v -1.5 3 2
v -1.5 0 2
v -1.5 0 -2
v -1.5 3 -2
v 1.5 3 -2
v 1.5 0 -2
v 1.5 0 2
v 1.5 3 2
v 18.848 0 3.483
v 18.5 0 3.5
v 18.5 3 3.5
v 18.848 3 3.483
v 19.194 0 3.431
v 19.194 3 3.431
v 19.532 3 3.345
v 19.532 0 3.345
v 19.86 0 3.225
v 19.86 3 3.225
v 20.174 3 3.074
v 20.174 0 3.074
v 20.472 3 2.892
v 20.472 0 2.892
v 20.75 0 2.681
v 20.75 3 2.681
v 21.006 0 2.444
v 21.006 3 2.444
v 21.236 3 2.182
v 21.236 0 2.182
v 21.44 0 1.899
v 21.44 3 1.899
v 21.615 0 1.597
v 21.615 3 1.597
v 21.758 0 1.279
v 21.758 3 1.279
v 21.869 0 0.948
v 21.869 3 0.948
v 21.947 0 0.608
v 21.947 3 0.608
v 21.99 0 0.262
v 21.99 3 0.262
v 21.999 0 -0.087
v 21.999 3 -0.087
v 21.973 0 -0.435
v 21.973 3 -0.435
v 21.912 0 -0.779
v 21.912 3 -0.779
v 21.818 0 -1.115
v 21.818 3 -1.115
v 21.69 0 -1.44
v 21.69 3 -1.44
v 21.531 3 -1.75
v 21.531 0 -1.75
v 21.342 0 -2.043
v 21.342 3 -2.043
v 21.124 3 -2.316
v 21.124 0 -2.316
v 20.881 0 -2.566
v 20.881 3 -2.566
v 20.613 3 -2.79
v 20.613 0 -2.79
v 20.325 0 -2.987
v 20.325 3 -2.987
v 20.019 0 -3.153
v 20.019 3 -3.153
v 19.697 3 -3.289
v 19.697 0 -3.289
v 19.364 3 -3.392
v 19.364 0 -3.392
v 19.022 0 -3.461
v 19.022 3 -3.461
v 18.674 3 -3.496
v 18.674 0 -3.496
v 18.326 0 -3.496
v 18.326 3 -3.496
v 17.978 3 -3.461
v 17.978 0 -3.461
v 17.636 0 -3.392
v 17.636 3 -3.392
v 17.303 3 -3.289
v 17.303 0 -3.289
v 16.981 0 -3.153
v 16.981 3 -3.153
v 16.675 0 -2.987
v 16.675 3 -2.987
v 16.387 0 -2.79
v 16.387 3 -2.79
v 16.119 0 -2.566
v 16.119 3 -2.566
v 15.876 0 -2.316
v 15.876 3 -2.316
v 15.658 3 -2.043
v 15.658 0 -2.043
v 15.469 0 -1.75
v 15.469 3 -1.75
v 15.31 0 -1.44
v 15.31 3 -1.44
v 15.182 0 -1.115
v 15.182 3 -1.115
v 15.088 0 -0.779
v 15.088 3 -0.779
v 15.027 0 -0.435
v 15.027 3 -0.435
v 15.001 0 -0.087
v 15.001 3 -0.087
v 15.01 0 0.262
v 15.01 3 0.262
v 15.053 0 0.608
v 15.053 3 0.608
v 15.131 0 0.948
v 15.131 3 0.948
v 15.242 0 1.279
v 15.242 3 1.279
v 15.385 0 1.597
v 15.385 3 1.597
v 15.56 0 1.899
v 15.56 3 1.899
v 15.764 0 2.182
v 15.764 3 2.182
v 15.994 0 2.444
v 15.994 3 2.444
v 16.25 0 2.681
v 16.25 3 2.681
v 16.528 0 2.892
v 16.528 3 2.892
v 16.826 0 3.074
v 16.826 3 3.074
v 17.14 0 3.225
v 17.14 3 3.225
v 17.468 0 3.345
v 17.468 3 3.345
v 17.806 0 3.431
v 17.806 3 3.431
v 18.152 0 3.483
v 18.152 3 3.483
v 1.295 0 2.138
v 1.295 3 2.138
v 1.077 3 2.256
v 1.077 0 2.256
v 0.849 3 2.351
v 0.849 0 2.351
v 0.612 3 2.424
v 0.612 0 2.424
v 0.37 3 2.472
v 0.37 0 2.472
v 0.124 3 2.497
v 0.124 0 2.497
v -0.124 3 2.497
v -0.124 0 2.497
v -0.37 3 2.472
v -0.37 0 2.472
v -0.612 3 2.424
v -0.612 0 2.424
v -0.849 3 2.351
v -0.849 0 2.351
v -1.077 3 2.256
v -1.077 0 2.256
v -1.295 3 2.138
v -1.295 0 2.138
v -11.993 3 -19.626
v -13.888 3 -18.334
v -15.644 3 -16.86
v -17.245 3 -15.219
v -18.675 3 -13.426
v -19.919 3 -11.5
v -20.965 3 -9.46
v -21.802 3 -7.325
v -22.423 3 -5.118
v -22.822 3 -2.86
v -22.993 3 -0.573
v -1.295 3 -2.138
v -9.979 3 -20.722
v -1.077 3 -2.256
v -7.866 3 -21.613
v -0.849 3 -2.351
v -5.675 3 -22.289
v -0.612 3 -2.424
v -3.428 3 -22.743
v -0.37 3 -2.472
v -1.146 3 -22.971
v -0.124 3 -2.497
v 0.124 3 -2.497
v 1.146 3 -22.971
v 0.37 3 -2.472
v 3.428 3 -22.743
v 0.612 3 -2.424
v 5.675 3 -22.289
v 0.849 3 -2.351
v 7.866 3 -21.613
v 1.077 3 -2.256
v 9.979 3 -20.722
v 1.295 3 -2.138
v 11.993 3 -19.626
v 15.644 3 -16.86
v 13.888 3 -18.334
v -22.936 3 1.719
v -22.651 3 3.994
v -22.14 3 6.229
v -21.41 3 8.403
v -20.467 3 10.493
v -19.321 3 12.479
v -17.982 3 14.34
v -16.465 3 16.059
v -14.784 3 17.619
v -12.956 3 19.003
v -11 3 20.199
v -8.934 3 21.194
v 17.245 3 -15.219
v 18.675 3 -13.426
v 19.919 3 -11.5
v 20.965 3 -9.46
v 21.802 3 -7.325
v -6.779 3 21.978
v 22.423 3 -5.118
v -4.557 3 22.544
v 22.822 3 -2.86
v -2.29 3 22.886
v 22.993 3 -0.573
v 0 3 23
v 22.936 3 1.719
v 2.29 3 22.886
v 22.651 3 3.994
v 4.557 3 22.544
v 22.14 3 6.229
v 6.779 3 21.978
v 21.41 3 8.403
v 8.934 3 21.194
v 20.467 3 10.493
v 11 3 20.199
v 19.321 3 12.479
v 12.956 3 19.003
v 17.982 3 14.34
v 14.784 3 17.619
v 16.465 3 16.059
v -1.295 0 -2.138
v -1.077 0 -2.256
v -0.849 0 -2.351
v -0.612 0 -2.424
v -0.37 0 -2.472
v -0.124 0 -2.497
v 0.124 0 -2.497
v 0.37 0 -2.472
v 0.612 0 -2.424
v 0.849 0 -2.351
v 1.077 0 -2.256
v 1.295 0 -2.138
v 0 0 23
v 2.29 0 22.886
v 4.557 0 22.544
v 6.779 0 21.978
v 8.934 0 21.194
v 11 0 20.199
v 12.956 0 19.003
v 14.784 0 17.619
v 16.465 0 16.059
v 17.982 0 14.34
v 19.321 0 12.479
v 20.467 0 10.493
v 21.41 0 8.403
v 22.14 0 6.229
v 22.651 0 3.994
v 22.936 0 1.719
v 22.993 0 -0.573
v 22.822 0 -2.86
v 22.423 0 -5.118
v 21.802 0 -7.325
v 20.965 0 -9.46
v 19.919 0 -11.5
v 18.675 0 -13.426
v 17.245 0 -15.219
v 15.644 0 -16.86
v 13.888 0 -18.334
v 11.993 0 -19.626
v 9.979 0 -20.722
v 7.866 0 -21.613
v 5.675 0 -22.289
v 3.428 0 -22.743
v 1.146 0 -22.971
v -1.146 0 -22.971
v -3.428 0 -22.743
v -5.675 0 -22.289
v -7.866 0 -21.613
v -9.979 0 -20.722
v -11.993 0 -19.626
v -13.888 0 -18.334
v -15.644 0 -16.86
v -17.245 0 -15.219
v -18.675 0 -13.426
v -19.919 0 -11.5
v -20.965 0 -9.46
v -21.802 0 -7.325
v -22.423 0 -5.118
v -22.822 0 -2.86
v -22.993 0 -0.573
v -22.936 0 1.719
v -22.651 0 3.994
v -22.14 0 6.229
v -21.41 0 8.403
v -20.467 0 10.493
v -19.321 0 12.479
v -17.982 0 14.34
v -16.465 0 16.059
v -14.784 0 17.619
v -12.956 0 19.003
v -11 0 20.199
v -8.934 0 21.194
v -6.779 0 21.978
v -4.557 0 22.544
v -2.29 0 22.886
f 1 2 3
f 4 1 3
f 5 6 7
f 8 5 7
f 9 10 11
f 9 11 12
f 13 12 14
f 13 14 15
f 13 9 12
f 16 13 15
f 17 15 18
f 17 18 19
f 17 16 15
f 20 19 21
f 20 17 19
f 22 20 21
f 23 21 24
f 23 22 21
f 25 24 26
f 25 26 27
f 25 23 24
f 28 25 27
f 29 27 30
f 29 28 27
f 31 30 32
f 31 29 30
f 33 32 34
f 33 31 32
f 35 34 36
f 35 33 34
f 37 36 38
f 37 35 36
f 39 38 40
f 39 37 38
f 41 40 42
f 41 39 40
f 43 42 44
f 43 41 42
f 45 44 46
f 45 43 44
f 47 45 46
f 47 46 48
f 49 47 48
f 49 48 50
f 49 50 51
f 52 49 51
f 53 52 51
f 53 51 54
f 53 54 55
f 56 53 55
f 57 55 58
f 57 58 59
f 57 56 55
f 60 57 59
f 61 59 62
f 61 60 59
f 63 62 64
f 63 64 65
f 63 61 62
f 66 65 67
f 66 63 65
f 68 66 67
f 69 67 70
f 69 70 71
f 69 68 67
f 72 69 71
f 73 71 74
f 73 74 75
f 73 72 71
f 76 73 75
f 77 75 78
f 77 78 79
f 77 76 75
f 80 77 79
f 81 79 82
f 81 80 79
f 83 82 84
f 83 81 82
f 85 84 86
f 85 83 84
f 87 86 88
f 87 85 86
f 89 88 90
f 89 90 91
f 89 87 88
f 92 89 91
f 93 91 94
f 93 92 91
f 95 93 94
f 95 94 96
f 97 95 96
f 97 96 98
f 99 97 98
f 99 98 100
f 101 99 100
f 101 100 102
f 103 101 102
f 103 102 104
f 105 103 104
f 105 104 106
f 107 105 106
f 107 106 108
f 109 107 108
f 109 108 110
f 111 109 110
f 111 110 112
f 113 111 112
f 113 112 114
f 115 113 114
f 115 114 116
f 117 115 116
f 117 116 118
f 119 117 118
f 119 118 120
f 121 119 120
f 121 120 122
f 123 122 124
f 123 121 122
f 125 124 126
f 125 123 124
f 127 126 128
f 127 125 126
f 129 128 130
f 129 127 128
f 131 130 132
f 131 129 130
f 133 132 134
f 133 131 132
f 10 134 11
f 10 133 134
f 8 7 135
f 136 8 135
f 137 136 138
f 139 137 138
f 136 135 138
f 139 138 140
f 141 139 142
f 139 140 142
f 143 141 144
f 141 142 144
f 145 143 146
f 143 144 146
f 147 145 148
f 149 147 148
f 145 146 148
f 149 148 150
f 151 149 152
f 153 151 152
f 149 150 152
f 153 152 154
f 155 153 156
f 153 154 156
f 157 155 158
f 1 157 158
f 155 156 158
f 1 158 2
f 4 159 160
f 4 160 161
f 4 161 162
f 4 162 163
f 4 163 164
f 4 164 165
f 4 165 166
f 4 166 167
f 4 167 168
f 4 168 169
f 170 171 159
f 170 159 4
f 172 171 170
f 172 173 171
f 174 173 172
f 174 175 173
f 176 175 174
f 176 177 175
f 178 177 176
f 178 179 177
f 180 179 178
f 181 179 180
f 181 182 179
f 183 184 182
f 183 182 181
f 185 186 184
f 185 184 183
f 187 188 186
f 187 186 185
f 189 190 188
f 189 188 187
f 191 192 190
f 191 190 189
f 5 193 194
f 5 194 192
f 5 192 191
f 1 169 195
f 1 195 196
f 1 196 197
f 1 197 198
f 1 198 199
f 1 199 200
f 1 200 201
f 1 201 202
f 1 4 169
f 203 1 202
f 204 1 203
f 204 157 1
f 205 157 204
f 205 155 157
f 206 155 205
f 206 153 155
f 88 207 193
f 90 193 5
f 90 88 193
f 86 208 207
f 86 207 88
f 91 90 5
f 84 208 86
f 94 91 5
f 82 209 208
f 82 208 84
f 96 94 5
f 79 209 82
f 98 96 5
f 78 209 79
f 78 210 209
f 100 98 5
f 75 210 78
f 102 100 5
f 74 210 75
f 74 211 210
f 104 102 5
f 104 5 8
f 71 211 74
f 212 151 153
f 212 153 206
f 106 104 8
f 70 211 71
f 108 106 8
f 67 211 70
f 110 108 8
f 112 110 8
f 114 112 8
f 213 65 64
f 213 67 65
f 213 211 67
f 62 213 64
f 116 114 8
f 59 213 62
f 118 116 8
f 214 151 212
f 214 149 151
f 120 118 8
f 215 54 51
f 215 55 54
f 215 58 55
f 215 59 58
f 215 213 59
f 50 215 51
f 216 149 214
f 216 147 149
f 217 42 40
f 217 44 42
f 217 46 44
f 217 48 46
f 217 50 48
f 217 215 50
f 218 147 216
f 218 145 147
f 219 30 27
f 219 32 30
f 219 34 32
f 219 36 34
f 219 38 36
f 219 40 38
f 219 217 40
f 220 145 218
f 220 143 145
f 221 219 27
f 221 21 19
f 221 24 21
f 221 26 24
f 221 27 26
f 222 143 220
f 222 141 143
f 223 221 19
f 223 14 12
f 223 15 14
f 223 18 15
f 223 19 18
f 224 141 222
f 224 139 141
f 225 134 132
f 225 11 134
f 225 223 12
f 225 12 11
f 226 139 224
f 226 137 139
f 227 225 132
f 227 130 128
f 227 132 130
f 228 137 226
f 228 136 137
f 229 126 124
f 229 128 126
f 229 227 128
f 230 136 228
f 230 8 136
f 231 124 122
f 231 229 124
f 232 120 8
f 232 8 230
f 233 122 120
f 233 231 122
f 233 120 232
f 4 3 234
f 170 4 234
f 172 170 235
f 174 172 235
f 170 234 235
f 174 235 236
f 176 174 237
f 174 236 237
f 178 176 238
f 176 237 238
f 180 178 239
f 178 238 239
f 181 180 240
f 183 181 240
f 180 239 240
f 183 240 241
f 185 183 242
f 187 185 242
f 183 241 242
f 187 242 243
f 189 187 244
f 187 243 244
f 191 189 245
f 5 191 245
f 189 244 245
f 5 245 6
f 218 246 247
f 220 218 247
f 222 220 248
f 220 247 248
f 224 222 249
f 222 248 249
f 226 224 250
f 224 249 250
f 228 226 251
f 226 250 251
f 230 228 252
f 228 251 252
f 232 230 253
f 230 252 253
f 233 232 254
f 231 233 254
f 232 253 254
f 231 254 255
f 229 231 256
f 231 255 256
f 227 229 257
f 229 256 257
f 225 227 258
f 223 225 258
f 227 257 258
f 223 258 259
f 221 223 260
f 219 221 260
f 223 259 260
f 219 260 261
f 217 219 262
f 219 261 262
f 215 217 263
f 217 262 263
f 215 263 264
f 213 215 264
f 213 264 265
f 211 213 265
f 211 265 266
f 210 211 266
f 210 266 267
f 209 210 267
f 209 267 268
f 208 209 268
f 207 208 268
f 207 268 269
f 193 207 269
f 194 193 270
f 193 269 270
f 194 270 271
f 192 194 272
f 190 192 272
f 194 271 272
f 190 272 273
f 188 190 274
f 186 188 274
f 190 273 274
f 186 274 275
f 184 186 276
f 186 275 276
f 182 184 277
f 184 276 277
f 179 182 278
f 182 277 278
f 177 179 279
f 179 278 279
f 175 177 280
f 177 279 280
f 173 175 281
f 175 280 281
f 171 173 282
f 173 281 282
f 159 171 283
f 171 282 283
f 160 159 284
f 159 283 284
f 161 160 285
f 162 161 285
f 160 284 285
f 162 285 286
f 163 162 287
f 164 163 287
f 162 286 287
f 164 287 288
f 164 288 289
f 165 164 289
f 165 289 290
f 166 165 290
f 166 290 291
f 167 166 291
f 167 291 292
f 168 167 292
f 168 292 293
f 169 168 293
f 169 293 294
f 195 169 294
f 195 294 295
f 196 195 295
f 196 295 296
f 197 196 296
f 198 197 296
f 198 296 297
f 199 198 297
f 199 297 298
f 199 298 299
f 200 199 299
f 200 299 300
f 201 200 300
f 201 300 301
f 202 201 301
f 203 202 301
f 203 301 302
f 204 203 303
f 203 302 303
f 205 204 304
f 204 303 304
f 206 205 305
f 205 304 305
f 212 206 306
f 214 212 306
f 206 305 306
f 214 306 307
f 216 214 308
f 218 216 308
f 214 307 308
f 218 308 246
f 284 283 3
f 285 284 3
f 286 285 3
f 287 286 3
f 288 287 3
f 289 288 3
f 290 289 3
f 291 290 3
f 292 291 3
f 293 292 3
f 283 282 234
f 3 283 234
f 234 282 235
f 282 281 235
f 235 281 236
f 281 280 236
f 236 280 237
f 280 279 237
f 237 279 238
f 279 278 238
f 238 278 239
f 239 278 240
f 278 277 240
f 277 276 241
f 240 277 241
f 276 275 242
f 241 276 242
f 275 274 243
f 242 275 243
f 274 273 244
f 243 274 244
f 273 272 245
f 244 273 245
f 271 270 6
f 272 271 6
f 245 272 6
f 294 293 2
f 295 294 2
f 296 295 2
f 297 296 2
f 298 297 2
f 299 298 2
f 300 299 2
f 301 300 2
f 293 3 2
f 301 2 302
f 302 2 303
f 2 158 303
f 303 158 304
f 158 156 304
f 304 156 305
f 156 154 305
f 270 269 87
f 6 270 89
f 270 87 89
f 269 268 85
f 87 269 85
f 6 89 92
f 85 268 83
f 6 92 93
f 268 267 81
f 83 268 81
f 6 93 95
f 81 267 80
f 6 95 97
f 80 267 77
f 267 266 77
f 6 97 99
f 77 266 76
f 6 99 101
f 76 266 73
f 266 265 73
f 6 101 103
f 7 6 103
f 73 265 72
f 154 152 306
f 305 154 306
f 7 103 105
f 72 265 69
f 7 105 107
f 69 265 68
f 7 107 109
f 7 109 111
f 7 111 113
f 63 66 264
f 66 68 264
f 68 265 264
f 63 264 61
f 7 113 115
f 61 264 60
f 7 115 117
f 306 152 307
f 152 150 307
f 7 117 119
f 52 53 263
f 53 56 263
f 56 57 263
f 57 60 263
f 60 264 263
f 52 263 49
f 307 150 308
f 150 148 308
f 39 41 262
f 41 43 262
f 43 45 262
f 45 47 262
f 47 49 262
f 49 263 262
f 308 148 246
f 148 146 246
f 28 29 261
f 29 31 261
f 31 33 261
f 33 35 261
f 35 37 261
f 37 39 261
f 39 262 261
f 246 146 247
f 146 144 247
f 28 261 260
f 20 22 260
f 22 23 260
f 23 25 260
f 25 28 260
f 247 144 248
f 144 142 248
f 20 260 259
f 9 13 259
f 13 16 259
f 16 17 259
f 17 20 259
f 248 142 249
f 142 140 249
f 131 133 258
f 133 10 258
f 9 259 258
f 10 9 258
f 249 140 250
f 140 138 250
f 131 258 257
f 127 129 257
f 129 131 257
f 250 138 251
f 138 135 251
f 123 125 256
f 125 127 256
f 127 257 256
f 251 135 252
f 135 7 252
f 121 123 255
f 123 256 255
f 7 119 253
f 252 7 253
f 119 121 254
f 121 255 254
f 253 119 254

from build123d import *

# Parameters (mm, degrees)
CROQUIS1_R              = 23
CROQUIS1_R_2            = 3.5
SALIENTE_EXTRUIR1_DEPTH = 3


with BuildPart() as part:
    # Croquis1 → Saliente-Extruir1 (new body)
    with BuildSketch(Plane(origin=(0, 0, 0), x_dir=(1, 0, 0), z_dir=(0, 1, 0))):
        with Locations(Location((0, 0, 0), (0, 0, 270))):
            Circle(CROQUIS1_R)
        with BuildLine():
            Line((1.5, 2), (1.5, -2))
            ThreePointArc((1.5, -2), (0, -2.5), (-1.5, -2))
            Line((-1.5, -2), (-1.5, 2))
            ThreePointArc((-1.5, 2), (0, 2.5), (1.5, 2))
        make_face(mode=Mode.SUBTRACT)
        with Locations(Location((18.5, 0, 0), (0, 0, 270))):
            Circle(CROQUIS1_R_2, mode=Mode.SUBTRACT)
    extrude(amount=SALIENTE_EXTRUIR1_DEPTH)


solid = part.part
